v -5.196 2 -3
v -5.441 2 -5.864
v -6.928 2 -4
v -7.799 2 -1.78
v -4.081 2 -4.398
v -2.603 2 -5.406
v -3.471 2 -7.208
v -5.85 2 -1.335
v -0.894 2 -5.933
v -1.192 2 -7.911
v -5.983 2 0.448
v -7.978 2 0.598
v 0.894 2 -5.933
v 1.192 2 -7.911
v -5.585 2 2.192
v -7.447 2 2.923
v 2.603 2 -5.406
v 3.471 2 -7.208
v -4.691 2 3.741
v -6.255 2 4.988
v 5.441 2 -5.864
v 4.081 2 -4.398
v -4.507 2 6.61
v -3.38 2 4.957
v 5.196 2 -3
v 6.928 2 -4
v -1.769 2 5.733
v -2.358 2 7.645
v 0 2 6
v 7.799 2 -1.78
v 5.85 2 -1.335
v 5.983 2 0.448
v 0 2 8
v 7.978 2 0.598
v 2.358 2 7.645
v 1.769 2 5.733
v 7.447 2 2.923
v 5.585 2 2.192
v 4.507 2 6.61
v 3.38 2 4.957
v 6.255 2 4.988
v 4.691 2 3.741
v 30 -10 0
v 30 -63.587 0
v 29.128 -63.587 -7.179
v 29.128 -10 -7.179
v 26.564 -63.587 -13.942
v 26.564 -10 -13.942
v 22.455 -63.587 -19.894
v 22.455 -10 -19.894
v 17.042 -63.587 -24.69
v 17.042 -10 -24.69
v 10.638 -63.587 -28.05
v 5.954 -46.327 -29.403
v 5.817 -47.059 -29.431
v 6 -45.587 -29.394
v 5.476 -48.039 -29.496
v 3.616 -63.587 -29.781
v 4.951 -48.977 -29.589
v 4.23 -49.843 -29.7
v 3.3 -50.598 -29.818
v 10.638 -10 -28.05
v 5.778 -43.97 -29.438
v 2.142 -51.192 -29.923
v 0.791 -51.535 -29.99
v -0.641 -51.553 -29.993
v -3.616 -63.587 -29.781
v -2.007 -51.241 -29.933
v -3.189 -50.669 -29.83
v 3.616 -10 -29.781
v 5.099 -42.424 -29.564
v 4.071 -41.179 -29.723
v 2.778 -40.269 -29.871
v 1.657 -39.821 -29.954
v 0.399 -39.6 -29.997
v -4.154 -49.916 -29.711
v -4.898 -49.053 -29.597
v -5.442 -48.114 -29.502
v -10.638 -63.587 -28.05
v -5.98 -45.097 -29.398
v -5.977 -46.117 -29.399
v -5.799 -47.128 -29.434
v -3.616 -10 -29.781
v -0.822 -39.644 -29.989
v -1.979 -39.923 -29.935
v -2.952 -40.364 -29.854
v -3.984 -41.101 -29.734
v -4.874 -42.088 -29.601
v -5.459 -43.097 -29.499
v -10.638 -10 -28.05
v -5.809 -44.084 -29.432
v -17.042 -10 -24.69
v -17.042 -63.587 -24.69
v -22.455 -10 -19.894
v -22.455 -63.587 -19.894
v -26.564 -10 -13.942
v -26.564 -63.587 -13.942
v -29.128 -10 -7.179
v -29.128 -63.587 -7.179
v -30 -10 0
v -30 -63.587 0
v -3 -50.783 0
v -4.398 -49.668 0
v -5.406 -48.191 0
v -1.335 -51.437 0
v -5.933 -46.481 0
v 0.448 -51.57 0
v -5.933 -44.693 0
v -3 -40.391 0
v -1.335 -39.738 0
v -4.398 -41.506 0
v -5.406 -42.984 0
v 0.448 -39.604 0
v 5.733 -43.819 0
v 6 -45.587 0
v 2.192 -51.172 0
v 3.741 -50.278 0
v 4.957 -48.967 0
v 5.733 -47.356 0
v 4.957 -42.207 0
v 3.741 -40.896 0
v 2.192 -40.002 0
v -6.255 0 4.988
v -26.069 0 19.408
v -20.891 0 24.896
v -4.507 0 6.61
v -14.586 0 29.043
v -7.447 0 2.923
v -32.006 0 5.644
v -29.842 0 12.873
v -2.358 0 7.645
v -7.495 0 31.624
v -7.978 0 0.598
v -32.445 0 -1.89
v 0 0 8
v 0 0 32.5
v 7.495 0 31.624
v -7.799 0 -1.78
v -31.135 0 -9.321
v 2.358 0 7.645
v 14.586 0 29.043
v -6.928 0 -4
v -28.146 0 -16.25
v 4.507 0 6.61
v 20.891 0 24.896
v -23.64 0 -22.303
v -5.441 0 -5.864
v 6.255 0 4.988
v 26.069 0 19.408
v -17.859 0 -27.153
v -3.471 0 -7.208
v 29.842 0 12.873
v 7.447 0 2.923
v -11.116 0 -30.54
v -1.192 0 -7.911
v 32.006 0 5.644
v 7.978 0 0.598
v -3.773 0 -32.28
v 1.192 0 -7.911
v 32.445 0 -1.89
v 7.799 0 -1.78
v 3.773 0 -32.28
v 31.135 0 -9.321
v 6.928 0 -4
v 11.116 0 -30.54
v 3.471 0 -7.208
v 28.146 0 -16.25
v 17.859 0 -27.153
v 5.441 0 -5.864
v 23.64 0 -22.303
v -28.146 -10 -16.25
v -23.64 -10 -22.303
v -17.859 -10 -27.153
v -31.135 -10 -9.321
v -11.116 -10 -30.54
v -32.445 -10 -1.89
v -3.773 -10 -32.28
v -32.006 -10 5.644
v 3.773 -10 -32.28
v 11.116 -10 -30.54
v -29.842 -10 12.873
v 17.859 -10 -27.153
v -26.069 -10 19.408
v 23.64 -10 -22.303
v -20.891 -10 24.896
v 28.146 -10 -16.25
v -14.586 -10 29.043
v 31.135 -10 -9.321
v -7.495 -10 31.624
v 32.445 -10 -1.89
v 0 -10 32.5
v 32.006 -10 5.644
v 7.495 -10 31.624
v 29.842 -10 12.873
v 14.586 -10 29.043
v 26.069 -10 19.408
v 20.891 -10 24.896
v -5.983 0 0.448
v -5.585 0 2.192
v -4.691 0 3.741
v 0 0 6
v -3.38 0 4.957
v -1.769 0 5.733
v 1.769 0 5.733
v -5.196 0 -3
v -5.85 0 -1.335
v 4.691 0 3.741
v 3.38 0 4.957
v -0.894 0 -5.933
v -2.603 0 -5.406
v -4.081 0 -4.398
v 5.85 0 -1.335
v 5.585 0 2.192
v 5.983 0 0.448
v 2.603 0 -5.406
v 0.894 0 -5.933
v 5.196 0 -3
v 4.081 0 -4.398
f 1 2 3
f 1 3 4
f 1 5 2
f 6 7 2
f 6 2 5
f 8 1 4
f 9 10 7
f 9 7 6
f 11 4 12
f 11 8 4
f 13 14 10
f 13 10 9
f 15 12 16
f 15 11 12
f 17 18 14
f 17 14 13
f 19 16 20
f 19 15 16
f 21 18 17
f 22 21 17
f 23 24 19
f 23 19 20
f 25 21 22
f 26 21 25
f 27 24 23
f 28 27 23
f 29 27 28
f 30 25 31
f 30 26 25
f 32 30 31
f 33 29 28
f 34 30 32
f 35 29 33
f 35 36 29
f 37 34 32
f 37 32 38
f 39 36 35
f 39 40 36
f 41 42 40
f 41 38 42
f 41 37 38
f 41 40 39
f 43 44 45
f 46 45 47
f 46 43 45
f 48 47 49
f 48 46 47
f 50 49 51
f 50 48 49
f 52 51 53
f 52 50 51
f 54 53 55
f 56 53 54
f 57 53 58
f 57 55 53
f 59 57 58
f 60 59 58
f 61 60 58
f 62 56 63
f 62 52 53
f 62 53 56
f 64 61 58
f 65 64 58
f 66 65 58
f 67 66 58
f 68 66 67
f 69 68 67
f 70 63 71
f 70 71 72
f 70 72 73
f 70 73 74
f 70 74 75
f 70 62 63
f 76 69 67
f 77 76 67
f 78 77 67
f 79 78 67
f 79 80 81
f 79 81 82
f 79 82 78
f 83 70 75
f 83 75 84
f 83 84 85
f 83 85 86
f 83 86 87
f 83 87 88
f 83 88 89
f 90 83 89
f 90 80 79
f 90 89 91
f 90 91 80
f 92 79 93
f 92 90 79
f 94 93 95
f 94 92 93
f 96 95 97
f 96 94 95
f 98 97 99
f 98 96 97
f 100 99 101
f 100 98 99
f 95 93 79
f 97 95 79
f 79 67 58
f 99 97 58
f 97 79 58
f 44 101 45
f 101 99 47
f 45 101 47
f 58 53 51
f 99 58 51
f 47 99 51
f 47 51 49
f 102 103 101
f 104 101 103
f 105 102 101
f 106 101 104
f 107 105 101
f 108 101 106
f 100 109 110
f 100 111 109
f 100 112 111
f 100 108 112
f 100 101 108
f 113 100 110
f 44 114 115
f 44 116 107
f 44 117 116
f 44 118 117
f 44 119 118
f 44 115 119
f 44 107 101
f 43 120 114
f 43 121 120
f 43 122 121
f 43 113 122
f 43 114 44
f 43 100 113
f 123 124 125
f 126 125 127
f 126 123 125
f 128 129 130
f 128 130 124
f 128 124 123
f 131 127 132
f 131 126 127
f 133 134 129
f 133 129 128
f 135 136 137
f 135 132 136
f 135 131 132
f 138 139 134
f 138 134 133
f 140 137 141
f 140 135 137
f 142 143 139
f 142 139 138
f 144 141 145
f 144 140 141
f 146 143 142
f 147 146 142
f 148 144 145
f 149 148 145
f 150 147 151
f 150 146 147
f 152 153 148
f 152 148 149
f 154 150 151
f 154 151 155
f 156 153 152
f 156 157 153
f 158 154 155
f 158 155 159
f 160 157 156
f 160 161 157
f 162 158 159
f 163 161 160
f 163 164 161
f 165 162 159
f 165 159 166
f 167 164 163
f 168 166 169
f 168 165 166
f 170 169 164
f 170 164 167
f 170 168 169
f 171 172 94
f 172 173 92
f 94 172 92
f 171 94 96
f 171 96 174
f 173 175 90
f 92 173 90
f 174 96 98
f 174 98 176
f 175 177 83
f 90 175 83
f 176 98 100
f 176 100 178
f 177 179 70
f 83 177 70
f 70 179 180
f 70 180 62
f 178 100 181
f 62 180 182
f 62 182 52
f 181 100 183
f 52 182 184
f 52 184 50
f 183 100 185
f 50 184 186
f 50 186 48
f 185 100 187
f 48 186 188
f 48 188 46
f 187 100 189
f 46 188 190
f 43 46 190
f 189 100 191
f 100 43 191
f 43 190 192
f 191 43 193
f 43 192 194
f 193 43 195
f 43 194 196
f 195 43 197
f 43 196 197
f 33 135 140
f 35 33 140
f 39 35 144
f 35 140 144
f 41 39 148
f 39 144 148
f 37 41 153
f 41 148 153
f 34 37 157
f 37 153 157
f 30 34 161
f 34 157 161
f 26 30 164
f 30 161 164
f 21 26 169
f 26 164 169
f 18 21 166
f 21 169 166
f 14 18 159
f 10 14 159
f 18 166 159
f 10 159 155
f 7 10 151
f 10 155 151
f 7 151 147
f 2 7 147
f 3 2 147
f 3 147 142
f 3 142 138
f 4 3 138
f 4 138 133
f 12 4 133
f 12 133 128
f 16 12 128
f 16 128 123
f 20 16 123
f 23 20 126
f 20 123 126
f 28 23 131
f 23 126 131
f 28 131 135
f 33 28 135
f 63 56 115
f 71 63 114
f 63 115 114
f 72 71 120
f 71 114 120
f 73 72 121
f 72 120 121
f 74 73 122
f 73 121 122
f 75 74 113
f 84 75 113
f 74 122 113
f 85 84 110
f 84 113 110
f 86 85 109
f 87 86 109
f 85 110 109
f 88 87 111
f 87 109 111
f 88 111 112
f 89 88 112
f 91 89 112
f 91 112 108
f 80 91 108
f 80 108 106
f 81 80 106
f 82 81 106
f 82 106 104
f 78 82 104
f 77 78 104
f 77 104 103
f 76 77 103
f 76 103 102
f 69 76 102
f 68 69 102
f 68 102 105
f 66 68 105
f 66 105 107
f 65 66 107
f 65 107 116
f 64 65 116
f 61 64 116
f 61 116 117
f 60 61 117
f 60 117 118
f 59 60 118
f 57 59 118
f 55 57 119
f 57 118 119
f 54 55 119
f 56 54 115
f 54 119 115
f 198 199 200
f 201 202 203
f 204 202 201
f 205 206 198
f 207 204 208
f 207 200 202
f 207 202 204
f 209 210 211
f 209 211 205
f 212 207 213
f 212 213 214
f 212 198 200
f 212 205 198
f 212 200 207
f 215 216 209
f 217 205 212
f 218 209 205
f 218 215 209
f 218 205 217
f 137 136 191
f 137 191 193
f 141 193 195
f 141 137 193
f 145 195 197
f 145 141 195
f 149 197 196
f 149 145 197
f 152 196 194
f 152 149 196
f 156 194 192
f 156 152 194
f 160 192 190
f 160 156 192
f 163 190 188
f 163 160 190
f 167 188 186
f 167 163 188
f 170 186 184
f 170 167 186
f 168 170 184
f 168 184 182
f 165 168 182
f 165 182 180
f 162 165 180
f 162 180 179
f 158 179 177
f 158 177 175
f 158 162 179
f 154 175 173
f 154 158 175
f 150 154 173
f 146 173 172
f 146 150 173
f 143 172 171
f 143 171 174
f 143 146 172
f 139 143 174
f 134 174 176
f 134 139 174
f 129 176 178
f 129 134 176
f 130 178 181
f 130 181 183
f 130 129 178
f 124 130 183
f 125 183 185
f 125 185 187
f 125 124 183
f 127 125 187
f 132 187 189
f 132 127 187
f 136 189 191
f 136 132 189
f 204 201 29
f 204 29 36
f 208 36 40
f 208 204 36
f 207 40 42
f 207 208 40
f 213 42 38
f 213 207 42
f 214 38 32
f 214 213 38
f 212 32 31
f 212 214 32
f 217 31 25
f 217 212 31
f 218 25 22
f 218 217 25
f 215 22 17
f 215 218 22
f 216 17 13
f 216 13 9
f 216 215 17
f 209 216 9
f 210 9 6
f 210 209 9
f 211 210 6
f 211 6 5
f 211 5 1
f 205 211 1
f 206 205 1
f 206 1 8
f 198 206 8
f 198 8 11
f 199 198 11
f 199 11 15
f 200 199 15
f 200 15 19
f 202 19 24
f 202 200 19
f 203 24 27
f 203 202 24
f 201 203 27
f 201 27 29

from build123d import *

# Parameters (mm, degrees)
SKETCH1_R           = 32.5
SKETCH1_R_2         = 30
BOSS_EXTRUDE3_DEPTH = 10
BOSS_EXTRUDE4_DEPTH = 63.5872
BOSS_EXTRUDE5_DEPTH = 10
SKETCH2_R           = 6
CUT_EXTRUDE1_DEPTH  = 45
SKETCH3_R           = 8
SKETCH3_R_2         = 6
BOSS_EXTRUDE6_DEPTH = 2


with BuildPart() as part:
    # Sketch1 → Boss-Extrude3 (new body)
    with BuildSketch(Plane(origin=(0, 0, 0), x_dir=(1, 0, 0), z_dir=(0, 1, 0))):
        Circle(SKETCH1_R)
        Circle(SKETCH1_R_2, mode=Mode.SUBTRACT)
    extrude(amount=-BOSS_EXTRUDE3_DEPTH)

    # Sketch1<3> → Boss-Extrude4 (add)
    with BuildSketch(Plane(origin=(0, 0, 0), x_dir=(1, 0, 0), z_dir=(0, 1, 0))):
        with BuildLine():
            Line((-30, 0), (30, 0))
            ThreePointArc((30, 0), (0, 30), (-30, 0))
        make_face()
    extrude(amount=-BOSS_EXTRUDE4_DEPTH)

    # Sketch1<4> → Boss-Extrude5 (add)
    with BuildSketch(Plane(origin=(0, 0, 0), x_dir=(1, 0, 0), z_dir=(0, 1, 0))):
        with BuildLine():
            ThreePointArc((-30, 0), (0, -30), (30, 0))
            Line((30, 0), (-30, 0))
        make_face()
    extrude(amount=-BOSS_EXTRUDE5_DEPTH)

    # Sketch2 → Cut-Extrude1 (cut)
    with BuildSketch(Plane.XY):
        with Locations((0, -45.5872)):
            Circle(SKETCH2_R)
    extrude(amount=-CUT_EXTRUDE1_DEPTH, mode=Mode.SUBTRACT)

    # Sketch3 → Boss-Extrude6 (add)
    with BuildSketch(Plane(origin=(0, 0, 0), x_dir=(1, 0, 0), z_dir=(0, 1, 0))):
        Circle(SKETCH3_R)
        Circle(SKETCH3_R_2, mode=Mode.SUBTRACT)
    extrude(amount=BOSS_EXTRUDE6_DEPTH)


solid = part.part
